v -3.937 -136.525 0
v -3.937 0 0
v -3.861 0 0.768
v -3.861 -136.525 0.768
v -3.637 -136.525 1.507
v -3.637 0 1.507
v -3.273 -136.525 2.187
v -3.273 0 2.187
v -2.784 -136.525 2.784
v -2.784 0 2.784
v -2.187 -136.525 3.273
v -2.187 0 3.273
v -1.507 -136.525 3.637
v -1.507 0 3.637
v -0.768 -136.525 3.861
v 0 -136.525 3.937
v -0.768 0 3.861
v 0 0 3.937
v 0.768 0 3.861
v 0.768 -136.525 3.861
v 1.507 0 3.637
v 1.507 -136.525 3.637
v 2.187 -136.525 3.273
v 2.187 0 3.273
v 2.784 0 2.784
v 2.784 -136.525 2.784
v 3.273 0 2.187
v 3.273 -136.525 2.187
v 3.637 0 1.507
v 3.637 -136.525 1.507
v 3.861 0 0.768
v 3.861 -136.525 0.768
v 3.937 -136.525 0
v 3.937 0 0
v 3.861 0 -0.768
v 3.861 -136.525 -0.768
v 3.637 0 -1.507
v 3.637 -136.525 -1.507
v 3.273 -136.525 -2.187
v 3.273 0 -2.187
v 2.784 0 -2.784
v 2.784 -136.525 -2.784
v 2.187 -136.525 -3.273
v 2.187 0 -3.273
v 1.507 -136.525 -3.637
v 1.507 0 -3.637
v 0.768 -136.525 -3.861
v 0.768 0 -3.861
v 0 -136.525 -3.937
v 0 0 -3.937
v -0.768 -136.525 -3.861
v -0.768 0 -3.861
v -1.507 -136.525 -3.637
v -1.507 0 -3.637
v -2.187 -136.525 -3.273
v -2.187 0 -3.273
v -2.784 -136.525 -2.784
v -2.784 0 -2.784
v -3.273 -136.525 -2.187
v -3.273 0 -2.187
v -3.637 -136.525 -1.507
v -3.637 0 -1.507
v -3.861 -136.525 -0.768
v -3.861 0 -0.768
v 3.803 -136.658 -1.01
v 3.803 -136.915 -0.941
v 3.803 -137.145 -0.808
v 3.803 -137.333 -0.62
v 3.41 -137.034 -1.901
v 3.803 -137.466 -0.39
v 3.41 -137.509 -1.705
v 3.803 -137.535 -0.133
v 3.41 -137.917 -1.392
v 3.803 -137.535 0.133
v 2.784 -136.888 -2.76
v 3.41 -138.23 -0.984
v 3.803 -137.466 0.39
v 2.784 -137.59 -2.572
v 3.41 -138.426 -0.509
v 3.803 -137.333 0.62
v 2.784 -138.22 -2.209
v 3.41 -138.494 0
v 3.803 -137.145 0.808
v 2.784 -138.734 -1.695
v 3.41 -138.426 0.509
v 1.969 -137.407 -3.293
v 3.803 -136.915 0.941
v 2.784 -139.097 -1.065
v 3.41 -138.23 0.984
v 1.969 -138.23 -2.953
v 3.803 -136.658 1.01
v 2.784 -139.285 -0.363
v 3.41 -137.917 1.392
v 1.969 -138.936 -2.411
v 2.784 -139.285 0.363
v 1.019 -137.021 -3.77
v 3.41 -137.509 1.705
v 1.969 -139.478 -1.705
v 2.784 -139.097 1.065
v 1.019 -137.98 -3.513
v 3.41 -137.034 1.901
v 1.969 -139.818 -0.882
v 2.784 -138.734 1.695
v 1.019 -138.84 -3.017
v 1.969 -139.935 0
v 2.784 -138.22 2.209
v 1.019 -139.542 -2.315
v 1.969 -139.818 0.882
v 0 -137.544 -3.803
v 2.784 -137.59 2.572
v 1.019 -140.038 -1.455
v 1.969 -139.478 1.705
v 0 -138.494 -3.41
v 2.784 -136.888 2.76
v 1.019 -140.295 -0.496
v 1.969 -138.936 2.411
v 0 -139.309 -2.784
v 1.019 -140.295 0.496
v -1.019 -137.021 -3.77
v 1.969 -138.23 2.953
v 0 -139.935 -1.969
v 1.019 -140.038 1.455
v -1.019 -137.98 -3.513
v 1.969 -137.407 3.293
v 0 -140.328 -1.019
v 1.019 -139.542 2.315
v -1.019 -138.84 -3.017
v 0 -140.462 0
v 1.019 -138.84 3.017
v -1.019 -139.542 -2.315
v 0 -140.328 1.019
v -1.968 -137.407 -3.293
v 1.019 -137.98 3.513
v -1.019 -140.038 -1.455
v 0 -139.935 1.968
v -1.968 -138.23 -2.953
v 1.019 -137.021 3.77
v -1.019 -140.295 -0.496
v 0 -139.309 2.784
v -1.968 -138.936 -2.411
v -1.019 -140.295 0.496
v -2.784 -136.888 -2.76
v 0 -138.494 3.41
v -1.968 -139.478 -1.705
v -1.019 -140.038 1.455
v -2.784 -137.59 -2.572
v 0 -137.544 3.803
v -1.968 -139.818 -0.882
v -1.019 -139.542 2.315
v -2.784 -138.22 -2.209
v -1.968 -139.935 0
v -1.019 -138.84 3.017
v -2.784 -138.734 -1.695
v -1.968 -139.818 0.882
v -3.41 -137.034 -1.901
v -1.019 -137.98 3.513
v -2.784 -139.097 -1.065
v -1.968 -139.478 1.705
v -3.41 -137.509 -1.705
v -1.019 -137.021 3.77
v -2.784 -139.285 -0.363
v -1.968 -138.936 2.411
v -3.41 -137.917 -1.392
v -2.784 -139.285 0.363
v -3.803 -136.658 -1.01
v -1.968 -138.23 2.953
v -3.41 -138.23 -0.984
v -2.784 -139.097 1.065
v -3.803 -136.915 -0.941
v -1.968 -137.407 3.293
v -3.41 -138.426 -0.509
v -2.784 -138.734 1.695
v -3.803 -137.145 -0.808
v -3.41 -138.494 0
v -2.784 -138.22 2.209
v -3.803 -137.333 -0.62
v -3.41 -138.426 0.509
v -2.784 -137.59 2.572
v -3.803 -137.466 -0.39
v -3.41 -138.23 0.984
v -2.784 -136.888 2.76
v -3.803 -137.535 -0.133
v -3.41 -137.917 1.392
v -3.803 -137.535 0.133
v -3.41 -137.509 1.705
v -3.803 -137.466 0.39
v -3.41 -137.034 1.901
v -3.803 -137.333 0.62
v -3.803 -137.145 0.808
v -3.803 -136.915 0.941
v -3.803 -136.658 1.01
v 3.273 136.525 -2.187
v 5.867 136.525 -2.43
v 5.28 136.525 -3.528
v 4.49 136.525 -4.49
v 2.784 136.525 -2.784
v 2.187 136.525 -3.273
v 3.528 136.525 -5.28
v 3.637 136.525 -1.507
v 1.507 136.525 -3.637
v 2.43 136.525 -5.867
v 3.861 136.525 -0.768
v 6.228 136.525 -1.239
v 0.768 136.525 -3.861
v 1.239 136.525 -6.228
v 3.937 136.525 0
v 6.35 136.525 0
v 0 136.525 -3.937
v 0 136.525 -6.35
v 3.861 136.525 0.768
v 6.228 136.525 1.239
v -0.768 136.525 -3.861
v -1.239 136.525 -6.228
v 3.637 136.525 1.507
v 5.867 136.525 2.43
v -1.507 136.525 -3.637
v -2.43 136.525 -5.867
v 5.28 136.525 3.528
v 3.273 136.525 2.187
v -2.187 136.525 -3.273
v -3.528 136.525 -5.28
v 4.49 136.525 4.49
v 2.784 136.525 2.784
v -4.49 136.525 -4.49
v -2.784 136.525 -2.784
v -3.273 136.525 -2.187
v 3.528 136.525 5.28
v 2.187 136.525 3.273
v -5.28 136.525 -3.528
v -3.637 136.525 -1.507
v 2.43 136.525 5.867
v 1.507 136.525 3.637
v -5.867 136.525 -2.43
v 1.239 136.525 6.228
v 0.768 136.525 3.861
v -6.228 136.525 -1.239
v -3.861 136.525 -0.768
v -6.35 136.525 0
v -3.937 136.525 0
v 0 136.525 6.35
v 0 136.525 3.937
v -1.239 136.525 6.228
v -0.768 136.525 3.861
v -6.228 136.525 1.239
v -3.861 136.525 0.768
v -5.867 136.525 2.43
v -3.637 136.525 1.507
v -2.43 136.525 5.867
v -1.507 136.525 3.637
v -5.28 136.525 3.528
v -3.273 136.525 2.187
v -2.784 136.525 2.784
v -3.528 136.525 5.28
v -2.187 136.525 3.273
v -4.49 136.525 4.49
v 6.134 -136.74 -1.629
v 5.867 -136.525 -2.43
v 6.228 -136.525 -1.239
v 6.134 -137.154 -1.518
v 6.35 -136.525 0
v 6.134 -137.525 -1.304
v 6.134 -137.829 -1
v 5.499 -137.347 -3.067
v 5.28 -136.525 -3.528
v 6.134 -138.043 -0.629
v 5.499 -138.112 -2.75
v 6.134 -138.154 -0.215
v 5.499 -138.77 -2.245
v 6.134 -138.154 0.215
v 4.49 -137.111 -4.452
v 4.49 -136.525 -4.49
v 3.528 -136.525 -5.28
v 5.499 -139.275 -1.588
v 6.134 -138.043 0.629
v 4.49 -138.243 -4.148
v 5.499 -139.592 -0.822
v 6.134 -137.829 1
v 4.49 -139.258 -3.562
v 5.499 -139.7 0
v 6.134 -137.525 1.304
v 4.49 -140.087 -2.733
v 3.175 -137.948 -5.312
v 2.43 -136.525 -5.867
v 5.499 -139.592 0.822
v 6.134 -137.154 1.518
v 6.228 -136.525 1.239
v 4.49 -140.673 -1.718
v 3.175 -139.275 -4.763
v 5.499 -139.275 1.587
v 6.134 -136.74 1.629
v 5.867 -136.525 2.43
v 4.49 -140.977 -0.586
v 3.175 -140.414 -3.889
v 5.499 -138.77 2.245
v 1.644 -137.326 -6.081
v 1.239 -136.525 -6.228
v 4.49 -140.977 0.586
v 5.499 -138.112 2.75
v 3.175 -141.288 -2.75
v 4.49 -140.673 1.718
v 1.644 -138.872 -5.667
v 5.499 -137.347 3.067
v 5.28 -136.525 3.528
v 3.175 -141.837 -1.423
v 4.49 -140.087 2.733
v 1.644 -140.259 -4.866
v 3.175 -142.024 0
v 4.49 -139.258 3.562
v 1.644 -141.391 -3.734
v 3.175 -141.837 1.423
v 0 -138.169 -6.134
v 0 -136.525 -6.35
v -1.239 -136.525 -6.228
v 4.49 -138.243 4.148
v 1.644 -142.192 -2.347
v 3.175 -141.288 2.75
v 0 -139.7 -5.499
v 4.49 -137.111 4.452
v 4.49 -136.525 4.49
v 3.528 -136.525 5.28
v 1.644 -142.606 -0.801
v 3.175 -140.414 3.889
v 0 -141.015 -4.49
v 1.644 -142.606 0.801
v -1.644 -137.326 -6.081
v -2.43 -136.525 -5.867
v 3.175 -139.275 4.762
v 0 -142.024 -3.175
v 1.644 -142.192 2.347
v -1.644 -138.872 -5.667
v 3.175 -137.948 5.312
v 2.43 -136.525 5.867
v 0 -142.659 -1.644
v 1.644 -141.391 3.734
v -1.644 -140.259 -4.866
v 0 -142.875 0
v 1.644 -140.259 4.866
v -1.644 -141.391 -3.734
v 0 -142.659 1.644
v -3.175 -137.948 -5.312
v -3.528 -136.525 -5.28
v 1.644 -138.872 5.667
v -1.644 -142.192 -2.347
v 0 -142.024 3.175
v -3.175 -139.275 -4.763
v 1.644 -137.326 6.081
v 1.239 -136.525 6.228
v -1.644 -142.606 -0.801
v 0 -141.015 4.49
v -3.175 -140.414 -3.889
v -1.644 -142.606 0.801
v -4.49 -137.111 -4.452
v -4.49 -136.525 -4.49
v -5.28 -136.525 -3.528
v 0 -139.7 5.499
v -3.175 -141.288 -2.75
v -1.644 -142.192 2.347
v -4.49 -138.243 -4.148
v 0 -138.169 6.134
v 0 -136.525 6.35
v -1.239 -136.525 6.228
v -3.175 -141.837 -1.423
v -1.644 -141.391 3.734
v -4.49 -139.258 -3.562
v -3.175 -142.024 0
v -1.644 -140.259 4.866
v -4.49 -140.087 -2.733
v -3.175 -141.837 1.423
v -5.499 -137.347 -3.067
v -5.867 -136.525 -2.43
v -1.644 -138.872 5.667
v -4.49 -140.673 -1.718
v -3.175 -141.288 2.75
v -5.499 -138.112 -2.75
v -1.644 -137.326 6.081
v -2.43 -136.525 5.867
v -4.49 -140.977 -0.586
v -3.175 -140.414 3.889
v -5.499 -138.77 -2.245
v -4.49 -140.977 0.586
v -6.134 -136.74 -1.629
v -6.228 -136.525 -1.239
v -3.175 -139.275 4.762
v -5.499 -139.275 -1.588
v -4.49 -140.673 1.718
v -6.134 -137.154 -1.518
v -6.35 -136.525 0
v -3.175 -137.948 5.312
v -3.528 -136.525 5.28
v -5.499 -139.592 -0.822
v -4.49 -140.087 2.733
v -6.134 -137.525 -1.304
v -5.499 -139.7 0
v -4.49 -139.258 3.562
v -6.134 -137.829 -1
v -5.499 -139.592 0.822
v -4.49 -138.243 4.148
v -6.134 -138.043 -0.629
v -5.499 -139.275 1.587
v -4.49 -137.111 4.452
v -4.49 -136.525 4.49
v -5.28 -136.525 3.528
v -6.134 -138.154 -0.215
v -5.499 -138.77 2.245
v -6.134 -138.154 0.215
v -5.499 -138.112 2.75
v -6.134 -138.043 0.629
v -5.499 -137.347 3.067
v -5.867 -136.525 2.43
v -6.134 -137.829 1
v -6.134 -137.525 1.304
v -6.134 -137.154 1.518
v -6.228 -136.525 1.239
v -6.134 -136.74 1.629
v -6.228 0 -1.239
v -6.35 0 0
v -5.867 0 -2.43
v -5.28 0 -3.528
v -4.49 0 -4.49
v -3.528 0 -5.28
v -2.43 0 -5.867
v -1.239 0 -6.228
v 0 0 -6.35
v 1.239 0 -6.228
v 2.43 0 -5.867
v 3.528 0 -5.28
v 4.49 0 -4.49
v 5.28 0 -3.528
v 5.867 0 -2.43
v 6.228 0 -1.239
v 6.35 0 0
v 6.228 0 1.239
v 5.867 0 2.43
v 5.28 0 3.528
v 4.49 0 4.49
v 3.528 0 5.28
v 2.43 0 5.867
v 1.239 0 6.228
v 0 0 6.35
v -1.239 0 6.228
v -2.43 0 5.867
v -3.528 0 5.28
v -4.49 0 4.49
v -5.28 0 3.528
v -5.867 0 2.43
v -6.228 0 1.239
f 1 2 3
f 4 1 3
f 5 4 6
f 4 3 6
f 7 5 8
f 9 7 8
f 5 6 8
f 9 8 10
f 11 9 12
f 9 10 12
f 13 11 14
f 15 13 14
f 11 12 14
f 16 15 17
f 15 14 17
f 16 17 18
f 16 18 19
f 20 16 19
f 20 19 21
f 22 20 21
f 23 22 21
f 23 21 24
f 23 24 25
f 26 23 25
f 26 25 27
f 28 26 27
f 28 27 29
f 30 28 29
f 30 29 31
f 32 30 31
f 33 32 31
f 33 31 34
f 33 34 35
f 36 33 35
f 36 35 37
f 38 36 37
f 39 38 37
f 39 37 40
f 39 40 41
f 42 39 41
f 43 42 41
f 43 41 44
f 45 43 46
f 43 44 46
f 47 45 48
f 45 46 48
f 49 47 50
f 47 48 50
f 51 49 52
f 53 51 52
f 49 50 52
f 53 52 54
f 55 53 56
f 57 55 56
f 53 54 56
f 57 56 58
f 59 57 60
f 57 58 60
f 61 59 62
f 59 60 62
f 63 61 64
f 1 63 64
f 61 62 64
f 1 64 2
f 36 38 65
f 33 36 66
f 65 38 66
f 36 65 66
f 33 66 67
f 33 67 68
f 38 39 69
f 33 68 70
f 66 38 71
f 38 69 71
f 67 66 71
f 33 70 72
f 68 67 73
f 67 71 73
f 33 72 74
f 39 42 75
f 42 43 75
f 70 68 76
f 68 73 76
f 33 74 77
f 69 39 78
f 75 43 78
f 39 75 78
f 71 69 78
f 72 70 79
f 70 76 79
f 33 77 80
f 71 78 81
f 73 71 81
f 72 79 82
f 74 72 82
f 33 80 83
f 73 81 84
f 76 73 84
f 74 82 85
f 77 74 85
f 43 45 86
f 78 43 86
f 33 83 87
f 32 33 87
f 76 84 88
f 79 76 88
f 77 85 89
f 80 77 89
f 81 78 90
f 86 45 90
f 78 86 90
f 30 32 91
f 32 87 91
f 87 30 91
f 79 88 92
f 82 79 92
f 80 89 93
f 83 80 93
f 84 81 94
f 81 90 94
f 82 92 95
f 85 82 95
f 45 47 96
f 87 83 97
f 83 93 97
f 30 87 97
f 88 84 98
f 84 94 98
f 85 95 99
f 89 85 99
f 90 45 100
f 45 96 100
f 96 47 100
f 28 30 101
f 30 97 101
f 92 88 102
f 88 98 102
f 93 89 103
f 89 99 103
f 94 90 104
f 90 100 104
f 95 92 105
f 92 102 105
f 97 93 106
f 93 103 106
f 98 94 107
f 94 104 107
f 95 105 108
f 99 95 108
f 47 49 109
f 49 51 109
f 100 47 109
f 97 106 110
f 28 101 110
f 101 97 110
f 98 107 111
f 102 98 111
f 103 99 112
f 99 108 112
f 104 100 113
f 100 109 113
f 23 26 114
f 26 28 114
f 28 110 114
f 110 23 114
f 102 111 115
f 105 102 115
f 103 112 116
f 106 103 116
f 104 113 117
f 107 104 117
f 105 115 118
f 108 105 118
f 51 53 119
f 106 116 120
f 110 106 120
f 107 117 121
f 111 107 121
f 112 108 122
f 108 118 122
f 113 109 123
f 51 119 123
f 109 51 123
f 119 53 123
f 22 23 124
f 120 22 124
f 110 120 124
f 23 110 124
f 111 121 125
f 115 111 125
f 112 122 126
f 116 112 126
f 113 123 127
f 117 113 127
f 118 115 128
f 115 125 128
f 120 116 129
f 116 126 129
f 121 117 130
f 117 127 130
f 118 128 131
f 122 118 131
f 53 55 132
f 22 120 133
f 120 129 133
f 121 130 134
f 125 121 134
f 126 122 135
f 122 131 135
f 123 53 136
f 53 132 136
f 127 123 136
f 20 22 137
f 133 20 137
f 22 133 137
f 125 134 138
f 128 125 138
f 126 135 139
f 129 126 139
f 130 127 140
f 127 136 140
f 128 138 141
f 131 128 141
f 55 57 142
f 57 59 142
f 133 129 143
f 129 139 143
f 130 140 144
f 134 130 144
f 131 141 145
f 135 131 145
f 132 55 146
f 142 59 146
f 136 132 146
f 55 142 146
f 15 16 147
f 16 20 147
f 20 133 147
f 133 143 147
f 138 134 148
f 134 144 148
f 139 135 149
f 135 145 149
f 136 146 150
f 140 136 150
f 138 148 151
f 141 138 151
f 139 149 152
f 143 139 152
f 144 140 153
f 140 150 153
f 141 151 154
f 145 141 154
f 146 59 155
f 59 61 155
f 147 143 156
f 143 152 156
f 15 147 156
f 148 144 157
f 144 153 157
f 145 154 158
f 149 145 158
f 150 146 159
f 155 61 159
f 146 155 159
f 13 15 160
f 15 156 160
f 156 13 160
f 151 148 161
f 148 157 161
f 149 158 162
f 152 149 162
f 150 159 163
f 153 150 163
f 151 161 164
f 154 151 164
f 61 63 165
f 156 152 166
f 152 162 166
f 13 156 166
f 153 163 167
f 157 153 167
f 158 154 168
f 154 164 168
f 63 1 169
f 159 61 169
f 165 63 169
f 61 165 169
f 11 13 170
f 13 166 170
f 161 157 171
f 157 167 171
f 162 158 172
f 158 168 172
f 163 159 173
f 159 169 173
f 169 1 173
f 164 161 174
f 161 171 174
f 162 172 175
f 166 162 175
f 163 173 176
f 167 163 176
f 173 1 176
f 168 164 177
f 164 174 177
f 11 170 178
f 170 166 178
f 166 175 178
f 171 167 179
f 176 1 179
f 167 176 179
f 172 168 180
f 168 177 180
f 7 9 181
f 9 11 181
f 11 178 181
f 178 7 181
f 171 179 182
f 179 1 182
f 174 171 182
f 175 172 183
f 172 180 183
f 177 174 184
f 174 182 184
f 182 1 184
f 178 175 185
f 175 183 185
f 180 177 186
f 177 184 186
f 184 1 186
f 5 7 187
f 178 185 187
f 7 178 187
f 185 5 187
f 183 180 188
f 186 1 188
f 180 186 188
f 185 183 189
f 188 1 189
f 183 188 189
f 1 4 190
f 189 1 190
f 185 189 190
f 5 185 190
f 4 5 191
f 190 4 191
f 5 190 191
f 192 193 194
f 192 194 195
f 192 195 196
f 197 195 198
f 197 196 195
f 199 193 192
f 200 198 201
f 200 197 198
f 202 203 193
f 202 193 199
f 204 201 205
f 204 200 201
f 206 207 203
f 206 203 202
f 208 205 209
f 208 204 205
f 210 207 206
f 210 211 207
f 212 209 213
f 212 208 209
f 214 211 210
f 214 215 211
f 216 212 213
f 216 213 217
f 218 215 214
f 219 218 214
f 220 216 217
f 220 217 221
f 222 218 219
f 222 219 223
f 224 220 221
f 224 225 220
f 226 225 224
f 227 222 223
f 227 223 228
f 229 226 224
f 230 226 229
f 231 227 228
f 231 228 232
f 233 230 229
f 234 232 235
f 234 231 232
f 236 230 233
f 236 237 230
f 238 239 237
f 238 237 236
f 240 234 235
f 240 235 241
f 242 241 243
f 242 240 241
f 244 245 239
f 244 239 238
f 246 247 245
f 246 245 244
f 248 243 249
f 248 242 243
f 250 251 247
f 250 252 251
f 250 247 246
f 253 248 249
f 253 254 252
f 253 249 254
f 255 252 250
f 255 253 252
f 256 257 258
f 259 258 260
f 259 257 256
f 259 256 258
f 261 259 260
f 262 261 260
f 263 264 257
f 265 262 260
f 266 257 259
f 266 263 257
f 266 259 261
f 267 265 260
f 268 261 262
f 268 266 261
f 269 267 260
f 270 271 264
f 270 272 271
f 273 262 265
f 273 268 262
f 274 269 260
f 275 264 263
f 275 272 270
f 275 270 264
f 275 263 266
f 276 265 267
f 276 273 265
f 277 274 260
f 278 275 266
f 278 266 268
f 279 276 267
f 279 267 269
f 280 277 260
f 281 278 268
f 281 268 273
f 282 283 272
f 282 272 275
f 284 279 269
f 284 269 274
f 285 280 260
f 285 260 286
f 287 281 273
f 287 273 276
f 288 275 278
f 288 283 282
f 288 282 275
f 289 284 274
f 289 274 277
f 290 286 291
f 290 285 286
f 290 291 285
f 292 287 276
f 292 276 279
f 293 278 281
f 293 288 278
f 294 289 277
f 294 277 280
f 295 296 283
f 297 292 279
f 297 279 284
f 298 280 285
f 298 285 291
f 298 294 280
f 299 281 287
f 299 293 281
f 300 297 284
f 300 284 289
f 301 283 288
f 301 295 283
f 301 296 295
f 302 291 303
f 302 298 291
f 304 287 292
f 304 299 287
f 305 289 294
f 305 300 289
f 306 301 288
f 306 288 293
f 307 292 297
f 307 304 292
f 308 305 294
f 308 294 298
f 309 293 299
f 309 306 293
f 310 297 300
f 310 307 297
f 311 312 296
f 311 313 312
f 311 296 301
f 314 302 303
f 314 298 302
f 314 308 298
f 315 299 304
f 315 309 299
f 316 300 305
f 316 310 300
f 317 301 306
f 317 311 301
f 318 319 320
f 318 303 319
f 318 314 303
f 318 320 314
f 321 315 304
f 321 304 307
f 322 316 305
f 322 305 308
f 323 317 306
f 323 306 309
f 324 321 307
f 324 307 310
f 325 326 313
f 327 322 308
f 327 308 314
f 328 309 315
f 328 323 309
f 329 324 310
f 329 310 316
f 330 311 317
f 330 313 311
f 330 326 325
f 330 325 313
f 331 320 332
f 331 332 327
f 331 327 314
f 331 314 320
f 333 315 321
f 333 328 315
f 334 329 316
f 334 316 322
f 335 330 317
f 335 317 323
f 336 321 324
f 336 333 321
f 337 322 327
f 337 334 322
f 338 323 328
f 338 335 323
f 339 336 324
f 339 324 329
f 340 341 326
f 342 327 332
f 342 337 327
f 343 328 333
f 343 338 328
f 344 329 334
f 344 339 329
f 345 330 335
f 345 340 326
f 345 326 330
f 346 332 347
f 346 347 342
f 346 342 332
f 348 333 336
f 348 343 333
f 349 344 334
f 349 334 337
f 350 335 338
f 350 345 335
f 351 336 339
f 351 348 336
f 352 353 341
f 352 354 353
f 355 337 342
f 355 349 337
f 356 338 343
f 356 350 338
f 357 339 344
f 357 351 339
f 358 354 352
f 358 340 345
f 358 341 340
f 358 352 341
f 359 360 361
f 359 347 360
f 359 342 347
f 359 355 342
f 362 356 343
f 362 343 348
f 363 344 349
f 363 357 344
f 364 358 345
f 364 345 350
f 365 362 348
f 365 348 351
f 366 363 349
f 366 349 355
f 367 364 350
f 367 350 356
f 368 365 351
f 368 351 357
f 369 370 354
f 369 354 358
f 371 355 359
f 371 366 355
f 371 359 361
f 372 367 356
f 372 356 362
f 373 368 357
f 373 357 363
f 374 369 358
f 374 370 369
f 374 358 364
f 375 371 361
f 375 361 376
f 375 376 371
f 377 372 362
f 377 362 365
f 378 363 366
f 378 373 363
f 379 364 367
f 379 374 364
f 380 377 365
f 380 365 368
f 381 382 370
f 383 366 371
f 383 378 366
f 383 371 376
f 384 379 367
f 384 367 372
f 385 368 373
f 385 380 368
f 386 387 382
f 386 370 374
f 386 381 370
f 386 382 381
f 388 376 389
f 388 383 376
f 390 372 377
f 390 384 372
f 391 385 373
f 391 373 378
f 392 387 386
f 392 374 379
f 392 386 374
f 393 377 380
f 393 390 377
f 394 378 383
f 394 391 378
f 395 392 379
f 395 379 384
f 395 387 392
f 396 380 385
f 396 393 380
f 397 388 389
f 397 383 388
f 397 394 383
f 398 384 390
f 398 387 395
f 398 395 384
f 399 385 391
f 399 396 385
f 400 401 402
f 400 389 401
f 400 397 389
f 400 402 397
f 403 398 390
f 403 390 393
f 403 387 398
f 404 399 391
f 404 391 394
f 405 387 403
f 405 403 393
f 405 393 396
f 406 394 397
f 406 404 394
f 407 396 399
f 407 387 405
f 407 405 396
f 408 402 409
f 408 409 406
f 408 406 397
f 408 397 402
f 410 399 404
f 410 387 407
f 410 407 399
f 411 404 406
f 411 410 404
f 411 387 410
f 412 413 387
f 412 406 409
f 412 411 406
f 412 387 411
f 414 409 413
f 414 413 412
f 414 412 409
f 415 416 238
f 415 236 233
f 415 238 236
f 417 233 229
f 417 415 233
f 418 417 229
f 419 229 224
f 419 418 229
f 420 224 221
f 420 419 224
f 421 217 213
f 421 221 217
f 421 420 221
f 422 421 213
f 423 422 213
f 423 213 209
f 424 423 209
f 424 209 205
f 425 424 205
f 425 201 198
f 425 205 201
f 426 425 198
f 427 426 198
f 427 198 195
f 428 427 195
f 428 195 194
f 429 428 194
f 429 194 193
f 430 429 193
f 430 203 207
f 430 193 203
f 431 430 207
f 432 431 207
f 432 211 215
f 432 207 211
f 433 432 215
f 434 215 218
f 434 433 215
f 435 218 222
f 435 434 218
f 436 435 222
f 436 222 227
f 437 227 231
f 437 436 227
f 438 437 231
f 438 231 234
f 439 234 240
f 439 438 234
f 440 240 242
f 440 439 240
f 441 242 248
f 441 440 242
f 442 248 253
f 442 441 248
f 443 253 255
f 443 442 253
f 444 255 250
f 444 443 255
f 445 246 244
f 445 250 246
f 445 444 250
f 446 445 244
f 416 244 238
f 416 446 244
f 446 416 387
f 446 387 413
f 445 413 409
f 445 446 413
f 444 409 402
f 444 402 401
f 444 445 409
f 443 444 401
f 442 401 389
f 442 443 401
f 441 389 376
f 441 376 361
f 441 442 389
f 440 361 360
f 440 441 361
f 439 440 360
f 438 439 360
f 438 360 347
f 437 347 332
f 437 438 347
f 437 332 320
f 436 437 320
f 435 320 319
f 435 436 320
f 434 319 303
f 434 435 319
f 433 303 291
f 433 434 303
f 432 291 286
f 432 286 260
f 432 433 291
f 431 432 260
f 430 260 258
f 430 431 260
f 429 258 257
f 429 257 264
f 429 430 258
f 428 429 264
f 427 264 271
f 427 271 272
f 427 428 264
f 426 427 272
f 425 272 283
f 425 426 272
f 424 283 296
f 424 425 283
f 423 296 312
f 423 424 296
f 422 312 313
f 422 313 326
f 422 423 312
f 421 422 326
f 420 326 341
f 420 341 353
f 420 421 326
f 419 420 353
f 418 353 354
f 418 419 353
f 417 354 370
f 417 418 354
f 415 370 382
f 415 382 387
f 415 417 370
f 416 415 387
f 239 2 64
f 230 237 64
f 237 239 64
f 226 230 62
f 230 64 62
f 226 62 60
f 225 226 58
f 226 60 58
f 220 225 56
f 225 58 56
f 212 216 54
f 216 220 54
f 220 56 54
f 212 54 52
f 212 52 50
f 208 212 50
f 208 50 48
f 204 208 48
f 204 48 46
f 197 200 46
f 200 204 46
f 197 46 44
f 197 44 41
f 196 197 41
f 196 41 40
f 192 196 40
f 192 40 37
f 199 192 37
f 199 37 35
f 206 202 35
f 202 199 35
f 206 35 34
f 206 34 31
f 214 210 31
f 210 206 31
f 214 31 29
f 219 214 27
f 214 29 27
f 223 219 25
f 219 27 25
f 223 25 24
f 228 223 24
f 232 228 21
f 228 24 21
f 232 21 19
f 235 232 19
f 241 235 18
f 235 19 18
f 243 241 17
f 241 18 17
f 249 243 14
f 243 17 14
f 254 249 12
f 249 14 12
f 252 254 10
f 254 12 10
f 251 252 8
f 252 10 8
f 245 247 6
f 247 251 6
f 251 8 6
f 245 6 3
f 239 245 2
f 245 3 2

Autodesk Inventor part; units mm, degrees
ref_plane "YZ Plane" through (0, 0, 0) normal (1, 0, 0) x (0, 1, 0)
ref_plane "XZ Plane" through (0, 0, 0) normal (0, 1, 0) x (-1, 0, 0)
ref_plane "XY Plane" through (0, 0, 0) normal (0, 0, 1) x (1, 0, 0)
sketch "Sketch1" plane through (0, 0, 0) normal (0, 1, 0) x (-1, 0, 0)
  circle A0 centre (0, 0) radius 6.35
  circle A1 centre (0, 0) radius 3.937
  dimension "d0" = 12.7
  dimension "d1" = 7.874
extrude "Extrusion1" add sketch "Sketch1" along normal mid plane 273.05
sketch "Sketch2" plane through (0, -136.525, 0) normal (0, -1, 0) x (1, 0, 0)
  circle A0 centre (0, 0) radius 3.937 projected
  circle A1 centre (0, 0) radius 6.35 projected
  circle A2 centre (0, 0) radius 6.35 projected
  line L0 (-6.35, 0) -> (0, 0)
  line L1 (6.35, 0) -> (0, 0)
  circle A3 centre (0, 0) radius 3.937 projected
  arc A4 (3.937, 0) -> (-3.937, 0) centre (0, 0) ccw
  arc A5 (6.35, 0) -> (-6.35, 0) centre (0, 0) ccw
revolve "Revolution1" add sketch "Sketch2" angle 180 about axis through (6.35, -136.525, 0) along (1, 0, 0) picked at (-5.446, 0.8206) contours A0 L0 A1 L1
equation "\"d0\" = glassTubeDiameter"
equation "\"d1\" = glassTubeID"
equation "\"d2\" = glassTubeLength - 0.5 * glassTubeDiameter"
equation "\"tubeHeight\" = 50.8"
equation "\"tubeWidth\" = 101.6"
equation "\"tubeLength\" = 304.8"
equation "\"tubeWallThickness\" = 3.175"
equation "\"plateOverhang\" = 6.35"
equation "\"moatWidth\" = 3.175"
equation "\"moatDepth\" = 3.175"
equation "\"tubePlateClearance\" = 0.127"
equation "\"blankCapThickness\" = 9.525"
equation "\"sensorCapThickness\" = 12.7"
equation "\"glassTubeDiameter\" = 12.7"
equation "\"glassTubeClearance\" = 0.19844"
equation "\"glassTubeID\" = 7.874"
equation "\"glassTubeLength\" = 279.4"
equation "\"longHoleSpacing\" = 30.48"
equation "\"shortHoleSpacing\" = 21.59"
equation "\"sensorHolderDiameter\" = 50.8"
equation "\"sensorHolderThickness\" = 12.7"
equation "\"fiberDiameter\" = 1"
equation "\"fiberClearance\" = 0"
equation "\"oRingID\" = 22.2504"
equation "\"oRingGrooveWidth\" = 2.54"
equation "\"oRingGrooveDepth\" = 1.2446"
properties part number "glassTube" material "Glass"
